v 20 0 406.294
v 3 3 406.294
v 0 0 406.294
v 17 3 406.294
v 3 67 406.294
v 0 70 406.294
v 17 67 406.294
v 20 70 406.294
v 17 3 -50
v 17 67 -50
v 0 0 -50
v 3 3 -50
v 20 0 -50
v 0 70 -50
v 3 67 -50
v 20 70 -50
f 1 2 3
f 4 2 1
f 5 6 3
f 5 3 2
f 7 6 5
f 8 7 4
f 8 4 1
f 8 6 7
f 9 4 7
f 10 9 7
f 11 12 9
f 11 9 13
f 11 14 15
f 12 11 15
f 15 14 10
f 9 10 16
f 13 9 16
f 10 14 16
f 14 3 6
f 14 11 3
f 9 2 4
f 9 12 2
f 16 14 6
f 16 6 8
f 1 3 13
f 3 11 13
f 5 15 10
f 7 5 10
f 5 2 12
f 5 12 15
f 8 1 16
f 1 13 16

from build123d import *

# Parameters (mm, degrees)
SKETCH1_W           = 3
SKETCH1_H           = 64
SKETCH1_H_2         = 3
SKETCH1_W_2         = 14
BOSS_EXTRUDE1_DEPTH = 50
SKETCH2_W           = 20
SKETCH2_H           = 70
SKETCH2_W_2         = 14
SKETCH2_H_2         = 64
BOSS_EXTRUDE2_DEPTH = 406.293714059


with BuildPart() as part:
    # Sketch1 → Boss-Extrude1 (new body)
    with BuildSketch(Plane.XY):
        with Locations((1.5, 35)):
            Rectangle(SKETCH1_W, SKETCH1_H)
        with Locations((1.5, 68.5)):
            Rectangle(SKETCH1_W, SKETCH1_H_2)
        with Locations((10, 68.5)):
            Rectangle(SKETCH1_W_2, SKETCH1_H_2)
        with Locations((18.5, 68.5)):
            Rectangle(SKETCH1_W, SKETCH1_H_2)
        with Locations((18.5, 35)):
            Rectangle(SKETCH1_W, SKETCH1_H)
        with Locations((10, 1.5)):
            Rectangle(SKETCH1_W_2, SKETCH1_H_2)
        with Locations((1.5, 1.5)):
            Rectangle(SKETCH1_W, SKETCH1_H_2)
        with Locations((18.5, 1.5)):
            Rectangle(SKETCH1_W, SKETCH1_H_2)
    extrude(amount=-BOSS_EXTRUDE1_DEPTH)

    # Sketch2 → Boss-Extrude2 (add)
    with BuildSketch(Plane.XY):
        with Locations((10, 35)):
            Rectangle(SKETCH2_W, SKETCH2_H)
        with Locations((10, 35)):
            Rectangle(SKETCH2_W_2, SKETCH2_H_2, mode=Mode.SUBTRACT)
    extrude(amount=BOSS_EXTRUDE2_DEPTH)


solid = part.part
